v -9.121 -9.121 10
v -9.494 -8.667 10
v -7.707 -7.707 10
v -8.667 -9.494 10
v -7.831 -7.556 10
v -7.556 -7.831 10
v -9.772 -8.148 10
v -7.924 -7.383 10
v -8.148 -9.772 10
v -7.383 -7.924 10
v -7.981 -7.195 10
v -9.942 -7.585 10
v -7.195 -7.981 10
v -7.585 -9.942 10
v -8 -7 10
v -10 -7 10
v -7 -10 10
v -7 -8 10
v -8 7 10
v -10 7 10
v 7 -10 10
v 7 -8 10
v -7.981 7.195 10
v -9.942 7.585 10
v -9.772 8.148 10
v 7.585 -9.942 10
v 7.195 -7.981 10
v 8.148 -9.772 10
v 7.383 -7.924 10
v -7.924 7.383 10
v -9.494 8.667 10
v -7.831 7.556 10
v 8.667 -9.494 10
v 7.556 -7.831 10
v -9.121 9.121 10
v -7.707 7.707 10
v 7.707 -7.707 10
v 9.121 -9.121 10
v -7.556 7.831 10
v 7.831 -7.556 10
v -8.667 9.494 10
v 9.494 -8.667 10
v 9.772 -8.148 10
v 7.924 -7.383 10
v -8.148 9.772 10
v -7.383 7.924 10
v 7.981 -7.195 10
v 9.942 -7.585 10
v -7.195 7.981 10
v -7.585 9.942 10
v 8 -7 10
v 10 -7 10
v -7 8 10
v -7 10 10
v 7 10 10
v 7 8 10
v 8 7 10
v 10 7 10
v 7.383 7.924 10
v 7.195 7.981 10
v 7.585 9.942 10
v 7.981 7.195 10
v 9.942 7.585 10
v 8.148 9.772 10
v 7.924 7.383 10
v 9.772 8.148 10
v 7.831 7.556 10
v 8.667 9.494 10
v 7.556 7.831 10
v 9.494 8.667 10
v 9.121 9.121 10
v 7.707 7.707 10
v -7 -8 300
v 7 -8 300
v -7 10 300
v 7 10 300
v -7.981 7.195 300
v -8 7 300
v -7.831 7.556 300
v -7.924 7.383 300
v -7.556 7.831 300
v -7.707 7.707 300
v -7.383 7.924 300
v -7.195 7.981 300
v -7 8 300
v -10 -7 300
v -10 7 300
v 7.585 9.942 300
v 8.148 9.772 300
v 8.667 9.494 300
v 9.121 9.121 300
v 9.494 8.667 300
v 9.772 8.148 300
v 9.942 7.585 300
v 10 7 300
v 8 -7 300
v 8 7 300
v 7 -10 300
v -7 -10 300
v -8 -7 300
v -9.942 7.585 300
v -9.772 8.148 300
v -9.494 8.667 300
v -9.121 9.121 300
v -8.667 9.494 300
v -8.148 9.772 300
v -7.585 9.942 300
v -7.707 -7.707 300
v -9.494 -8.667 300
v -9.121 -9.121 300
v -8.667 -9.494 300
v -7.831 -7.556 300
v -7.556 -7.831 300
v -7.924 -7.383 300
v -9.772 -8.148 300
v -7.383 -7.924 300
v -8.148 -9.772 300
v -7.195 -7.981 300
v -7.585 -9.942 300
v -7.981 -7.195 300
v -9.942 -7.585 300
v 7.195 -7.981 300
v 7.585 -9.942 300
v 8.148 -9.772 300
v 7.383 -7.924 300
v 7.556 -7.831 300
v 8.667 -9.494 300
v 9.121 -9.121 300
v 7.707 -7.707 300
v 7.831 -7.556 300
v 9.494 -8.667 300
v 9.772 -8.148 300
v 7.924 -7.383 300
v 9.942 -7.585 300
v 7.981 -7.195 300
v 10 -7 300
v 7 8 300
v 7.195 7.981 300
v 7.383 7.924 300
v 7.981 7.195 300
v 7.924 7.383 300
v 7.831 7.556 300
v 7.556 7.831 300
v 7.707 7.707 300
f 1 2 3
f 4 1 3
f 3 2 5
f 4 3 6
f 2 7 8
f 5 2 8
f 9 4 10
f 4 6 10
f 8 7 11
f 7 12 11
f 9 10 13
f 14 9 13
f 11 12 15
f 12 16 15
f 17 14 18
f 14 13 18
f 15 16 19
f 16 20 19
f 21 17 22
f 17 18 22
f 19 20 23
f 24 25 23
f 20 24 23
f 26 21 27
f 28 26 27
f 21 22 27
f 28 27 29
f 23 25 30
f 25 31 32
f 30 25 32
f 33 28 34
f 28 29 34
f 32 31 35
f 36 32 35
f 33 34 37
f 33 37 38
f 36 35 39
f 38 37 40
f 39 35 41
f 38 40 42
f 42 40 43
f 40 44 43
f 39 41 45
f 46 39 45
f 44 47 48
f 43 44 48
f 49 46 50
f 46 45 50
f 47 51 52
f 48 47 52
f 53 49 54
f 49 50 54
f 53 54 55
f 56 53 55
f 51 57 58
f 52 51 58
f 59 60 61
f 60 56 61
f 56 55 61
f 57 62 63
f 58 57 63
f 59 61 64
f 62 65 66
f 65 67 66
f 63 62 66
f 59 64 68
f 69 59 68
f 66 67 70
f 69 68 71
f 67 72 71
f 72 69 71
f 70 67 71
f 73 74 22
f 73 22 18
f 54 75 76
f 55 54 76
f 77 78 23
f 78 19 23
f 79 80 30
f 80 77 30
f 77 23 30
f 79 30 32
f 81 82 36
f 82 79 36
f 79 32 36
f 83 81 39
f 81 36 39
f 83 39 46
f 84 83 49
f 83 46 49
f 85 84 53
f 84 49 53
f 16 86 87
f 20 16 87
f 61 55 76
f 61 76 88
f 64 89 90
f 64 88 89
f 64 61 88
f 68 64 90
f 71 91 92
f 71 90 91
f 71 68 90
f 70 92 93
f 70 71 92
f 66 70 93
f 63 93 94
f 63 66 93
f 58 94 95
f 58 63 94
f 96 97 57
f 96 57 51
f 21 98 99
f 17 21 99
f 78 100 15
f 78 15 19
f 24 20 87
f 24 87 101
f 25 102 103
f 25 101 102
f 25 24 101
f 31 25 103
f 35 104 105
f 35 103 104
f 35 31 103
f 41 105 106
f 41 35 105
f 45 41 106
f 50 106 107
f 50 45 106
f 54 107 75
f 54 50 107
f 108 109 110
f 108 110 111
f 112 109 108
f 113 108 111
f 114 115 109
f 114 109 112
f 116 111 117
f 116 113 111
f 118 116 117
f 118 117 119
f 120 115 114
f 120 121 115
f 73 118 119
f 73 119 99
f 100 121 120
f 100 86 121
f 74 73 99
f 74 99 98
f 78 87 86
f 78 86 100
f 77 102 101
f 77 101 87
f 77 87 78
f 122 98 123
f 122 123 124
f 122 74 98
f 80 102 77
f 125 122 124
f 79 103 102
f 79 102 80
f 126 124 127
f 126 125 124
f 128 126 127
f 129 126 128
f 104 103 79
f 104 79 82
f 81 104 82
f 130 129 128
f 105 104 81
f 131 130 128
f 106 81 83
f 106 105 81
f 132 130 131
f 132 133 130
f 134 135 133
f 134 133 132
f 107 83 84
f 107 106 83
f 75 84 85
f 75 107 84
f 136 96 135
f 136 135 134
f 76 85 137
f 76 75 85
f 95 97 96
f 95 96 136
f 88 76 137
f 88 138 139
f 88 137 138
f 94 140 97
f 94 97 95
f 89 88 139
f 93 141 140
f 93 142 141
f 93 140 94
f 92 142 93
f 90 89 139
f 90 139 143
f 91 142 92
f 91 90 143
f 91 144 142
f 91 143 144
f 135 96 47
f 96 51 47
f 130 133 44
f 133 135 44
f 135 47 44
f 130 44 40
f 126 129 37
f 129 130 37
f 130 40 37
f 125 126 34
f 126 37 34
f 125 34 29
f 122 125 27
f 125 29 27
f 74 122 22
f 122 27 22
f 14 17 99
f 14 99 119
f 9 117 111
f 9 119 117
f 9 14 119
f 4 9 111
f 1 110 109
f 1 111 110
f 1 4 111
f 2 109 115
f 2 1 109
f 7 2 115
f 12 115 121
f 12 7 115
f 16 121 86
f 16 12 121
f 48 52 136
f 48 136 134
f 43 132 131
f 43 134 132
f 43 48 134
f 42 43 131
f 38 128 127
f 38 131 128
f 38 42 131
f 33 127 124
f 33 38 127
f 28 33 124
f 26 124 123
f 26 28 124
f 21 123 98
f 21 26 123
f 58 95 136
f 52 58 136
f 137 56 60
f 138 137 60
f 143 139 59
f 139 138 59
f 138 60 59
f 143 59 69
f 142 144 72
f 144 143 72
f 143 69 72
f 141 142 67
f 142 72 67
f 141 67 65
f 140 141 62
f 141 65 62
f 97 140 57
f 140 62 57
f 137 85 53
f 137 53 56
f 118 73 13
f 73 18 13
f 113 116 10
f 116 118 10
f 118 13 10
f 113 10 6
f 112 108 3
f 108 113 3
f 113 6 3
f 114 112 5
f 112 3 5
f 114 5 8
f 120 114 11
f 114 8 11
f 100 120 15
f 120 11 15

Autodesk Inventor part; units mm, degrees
ref_plane "Start Plane" through (0, 0, 10) normal (0, 0, 1) x (1, 0, 0)
ref_plane "End Plane" through (0, 0, 300) normal (0, 0, 1) x (1, 0, 0)
sketch "Sketch" plane through (0, 0, 0) normal (0, 0, 1) x (1, 0, 0)
  line L0 (-10, -7) -> (-10, 7)
  line L1 (-7, 10) -> (7, 10)
  line L2 (10, 7) -> (10, -7)
  line L3 (7, -10) -> (-7, -10)
  arc A0 (-10, -7) -> (-7, -10) centre (-7, -7) ccw
  arc A1 (-7, 10) -> (-10, 7) centre (-7, 7) ccw
  arc A2 (10, 7) -> (7, 10) centre (7, 7) ccw
  arc A3 (7, -10) -> (10, -7) centre (7, -7) ccw
  arc A4 (-7, 8) -> (-8, 7) centre (-7, 7) ccw
  line L4 (-7, 8) -> (7, 8)
  arc A5 (8, 7) -> (7, 8) centre (7, 7) ccw
  line L5 (8, 7) -> (8, -7)
  arc A6 (7, -8) -> (8, -7) centre (7, -7) ccw
  line L6 (7, -8) -> (-7, -8)
  arc A7 (-8, -7) -> (-7, -8) centre (-7, -7) ccw
  line L7 (-8, -7) -> (-8, 7)
  line L8 (0, 14.8698) -> (0, -14.8698) construction
  line L9 (-14.8698, 0) -> (14.8698, 0) construction
  dimension "d7" = 3
  dimension "d10" = 20
  dimension "d11" = 20
  dimension "d12" = 2
  dimension "d15" = 10
  dimension "d16" = 10
extrude "Body" add sketch "Sketch" along normal up to surface (290 mm away) from surface at 10
sketch "Sketch3" plane through (0, 0, 0) normal (0, 0, 1) x (1, 0, 0)
  line L0 (0, 0) -> (10, 0)
ref_plane "Work Plane3" through (0, 0, 0) normal (0, -1, 0) x (1, 0, 0)
sketch "Sketch4" plane through (0, 0, 0) normal (0, -1, 0) x (1, 0, 0)
  line L0 (-2, 10) -> (12, 10)
  line L1 (-2, 300) -> (12, 300)
  dimension "d18" = 290
ref_plane "Work Plane4" through (155, -7, 300) normal (0, 0, 1) x (1, 0, 0)
split "Split1" plane through (155, -7, 300) removes the side toward (0, 0, 1)
ref_plane "Work Plane5" through (-75, -7, 10) normal (0, 0, -1) x (-1, 0, 0)
split "Split2" plane through (-75, -7, 10) removes the side toward (0, 0, -1)
equation "\"d7\" = G_IR"
equation "\"d10\" = G_H"
equation "\"d11\" = G_W"
equation "\"d12\" = G_T"
equation "\"d15\" = 0.5 * d10"
equation "\"d16\" = 0.5 * d11"
equation "\"d3\" = G_L"
equation "\"G_W\" = 20"
equation "\"G_H\" = 20"
equation "\"G_T\" = 2"
equation "\"G_IR\" = 3"
equation "\"G_L\" = d18"
properties part number "ISO 12633-2 - 20x20x2 - 290" material "Steel, Mild"
